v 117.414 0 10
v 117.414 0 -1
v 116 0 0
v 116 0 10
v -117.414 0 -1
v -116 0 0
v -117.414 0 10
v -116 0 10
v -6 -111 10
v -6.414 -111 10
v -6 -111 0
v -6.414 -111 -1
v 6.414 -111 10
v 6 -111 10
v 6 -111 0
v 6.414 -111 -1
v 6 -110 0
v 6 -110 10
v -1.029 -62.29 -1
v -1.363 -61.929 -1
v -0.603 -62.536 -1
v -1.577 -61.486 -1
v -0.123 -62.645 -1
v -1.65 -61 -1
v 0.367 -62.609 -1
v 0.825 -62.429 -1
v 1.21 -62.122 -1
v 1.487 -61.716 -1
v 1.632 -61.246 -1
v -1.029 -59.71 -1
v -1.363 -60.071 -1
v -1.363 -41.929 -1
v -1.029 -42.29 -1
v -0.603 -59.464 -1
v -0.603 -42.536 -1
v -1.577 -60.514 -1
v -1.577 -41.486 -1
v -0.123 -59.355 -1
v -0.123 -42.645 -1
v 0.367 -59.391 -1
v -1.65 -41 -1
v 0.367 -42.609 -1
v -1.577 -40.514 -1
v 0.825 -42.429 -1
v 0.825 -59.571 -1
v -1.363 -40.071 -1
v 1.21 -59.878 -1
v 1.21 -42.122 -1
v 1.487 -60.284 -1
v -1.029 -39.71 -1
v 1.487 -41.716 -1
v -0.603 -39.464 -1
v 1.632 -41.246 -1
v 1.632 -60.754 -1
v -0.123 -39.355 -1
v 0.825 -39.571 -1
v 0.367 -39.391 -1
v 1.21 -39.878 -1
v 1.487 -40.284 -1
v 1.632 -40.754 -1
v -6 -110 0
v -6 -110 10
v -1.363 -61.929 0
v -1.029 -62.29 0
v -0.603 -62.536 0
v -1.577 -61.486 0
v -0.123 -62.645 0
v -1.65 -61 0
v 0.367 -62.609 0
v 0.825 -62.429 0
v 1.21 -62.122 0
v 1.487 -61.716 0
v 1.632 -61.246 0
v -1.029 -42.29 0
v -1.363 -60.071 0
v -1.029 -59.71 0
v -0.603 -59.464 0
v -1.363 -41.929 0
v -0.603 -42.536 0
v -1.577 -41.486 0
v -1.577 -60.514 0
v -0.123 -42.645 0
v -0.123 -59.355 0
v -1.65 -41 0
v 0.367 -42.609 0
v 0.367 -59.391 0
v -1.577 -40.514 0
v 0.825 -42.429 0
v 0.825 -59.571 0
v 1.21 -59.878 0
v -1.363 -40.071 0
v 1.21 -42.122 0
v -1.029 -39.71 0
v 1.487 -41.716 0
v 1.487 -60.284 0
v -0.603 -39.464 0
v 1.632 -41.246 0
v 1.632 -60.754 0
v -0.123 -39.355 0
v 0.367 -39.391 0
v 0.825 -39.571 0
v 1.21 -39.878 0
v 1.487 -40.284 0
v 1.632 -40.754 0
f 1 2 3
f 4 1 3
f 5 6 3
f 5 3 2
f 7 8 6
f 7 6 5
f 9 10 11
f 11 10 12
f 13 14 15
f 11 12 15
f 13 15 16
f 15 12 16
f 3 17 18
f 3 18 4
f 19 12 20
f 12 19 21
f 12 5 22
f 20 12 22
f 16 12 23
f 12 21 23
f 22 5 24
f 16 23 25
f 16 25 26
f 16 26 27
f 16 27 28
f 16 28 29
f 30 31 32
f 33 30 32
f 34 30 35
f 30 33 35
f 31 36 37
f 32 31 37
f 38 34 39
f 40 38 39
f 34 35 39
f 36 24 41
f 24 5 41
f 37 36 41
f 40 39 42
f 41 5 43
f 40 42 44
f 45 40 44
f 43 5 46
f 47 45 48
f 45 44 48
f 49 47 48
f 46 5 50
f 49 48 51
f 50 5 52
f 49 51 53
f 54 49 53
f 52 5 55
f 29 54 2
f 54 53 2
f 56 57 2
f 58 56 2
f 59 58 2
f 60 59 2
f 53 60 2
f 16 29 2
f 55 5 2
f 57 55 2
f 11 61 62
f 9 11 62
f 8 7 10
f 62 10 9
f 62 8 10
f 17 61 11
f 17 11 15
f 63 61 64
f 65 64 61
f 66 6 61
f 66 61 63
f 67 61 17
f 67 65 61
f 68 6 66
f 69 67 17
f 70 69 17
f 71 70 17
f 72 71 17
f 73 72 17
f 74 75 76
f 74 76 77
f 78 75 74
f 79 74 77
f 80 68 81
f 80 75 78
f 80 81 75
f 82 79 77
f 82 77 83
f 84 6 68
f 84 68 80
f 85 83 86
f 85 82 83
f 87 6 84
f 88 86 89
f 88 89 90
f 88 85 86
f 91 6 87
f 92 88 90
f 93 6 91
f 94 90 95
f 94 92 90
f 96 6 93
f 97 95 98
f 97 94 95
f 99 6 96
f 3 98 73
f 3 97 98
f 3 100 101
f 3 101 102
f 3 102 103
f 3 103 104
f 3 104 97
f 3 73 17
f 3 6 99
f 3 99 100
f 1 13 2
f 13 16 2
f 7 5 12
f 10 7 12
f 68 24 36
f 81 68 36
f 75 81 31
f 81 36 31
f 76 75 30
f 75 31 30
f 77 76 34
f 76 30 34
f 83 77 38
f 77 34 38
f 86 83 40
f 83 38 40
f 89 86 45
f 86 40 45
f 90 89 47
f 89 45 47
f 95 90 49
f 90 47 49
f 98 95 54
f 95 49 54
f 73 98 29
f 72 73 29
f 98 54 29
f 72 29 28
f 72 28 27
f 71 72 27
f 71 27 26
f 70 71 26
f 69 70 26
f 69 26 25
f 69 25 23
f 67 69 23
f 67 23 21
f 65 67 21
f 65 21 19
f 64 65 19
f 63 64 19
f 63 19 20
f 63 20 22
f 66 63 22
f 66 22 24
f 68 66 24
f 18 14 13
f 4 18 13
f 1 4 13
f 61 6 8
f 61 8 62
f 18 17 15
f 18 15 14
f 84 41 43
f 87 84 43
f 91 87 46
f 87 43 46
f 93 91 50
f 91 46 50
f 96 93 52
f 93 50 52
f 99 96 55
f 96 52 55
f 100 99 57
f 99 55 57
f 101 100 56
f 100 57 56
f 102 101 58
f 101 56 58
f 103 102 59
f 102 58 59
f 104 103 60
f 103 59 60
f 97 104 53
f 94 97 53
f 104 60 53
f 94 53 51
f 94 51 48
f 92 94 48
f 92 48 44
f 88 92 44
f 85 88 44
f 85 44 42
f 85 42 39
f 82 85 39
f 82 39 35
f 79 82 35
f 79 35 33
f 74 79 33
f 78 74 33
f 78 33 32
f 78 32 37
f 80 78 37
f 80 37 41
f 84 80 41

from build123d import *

# Parameters (mm, degrees)
F1_DEPTH = 10
F2_T     = 1
F3_W     = 12
F3_H     = 10
F4_DEPTH = 25
F5_W     = 236.8284271247
F5_H     = 11
F6_DEPTH = 1
F8_D     = 3.3


with BuildPart() as f1:
    # F0 (on Top) → F1 (new body)
    with BuildSketch(Plane.XY):
        Polygon((116, 0), (-116, 0), (-6, -110), (6, -110), align=None)
    extrude(amount=F1_DEPTH)

    # F2
    f2_openings = [f1.faces().sort_by_distance(p)[0] for p in [
        (0, -38.469945, 10),
    ]]
    offset(amount=F2_T, openings=f2_openings, kind=Kind.INTERSECTION)

    # F3 (on face) → F4 (cut)
    with BuildSketch(Plane(origin=(0, -110, 0), x_dir=(-1, 0, 0), z_dir=(0, 1, 0))):
        with Locations((0, 5)):
            Rectangle(F3_W, F3_H)
    extrude(amount=-F4_DEPTH, mode=Mode.SUBTRACT)

    # F5 (on face) → F6 (cut)
    with BuildSketch(Plane(origin=(0, 1, 0), x_dir=(-1, 0, 0), z_dir=(0, 1, 0))):
        with Locations((0, 4.5)):
            Rectangle(F5_W, F5_H)
    extrude(amount=-F6_DEPTH, mode=Mode.SUBTRACT)

    # F8 (through all)
    with Locations(Plane.XY):
        with Locations((0, -41), (0, -61)):
            Hole(F8_D / 2)


solid = f1.part
